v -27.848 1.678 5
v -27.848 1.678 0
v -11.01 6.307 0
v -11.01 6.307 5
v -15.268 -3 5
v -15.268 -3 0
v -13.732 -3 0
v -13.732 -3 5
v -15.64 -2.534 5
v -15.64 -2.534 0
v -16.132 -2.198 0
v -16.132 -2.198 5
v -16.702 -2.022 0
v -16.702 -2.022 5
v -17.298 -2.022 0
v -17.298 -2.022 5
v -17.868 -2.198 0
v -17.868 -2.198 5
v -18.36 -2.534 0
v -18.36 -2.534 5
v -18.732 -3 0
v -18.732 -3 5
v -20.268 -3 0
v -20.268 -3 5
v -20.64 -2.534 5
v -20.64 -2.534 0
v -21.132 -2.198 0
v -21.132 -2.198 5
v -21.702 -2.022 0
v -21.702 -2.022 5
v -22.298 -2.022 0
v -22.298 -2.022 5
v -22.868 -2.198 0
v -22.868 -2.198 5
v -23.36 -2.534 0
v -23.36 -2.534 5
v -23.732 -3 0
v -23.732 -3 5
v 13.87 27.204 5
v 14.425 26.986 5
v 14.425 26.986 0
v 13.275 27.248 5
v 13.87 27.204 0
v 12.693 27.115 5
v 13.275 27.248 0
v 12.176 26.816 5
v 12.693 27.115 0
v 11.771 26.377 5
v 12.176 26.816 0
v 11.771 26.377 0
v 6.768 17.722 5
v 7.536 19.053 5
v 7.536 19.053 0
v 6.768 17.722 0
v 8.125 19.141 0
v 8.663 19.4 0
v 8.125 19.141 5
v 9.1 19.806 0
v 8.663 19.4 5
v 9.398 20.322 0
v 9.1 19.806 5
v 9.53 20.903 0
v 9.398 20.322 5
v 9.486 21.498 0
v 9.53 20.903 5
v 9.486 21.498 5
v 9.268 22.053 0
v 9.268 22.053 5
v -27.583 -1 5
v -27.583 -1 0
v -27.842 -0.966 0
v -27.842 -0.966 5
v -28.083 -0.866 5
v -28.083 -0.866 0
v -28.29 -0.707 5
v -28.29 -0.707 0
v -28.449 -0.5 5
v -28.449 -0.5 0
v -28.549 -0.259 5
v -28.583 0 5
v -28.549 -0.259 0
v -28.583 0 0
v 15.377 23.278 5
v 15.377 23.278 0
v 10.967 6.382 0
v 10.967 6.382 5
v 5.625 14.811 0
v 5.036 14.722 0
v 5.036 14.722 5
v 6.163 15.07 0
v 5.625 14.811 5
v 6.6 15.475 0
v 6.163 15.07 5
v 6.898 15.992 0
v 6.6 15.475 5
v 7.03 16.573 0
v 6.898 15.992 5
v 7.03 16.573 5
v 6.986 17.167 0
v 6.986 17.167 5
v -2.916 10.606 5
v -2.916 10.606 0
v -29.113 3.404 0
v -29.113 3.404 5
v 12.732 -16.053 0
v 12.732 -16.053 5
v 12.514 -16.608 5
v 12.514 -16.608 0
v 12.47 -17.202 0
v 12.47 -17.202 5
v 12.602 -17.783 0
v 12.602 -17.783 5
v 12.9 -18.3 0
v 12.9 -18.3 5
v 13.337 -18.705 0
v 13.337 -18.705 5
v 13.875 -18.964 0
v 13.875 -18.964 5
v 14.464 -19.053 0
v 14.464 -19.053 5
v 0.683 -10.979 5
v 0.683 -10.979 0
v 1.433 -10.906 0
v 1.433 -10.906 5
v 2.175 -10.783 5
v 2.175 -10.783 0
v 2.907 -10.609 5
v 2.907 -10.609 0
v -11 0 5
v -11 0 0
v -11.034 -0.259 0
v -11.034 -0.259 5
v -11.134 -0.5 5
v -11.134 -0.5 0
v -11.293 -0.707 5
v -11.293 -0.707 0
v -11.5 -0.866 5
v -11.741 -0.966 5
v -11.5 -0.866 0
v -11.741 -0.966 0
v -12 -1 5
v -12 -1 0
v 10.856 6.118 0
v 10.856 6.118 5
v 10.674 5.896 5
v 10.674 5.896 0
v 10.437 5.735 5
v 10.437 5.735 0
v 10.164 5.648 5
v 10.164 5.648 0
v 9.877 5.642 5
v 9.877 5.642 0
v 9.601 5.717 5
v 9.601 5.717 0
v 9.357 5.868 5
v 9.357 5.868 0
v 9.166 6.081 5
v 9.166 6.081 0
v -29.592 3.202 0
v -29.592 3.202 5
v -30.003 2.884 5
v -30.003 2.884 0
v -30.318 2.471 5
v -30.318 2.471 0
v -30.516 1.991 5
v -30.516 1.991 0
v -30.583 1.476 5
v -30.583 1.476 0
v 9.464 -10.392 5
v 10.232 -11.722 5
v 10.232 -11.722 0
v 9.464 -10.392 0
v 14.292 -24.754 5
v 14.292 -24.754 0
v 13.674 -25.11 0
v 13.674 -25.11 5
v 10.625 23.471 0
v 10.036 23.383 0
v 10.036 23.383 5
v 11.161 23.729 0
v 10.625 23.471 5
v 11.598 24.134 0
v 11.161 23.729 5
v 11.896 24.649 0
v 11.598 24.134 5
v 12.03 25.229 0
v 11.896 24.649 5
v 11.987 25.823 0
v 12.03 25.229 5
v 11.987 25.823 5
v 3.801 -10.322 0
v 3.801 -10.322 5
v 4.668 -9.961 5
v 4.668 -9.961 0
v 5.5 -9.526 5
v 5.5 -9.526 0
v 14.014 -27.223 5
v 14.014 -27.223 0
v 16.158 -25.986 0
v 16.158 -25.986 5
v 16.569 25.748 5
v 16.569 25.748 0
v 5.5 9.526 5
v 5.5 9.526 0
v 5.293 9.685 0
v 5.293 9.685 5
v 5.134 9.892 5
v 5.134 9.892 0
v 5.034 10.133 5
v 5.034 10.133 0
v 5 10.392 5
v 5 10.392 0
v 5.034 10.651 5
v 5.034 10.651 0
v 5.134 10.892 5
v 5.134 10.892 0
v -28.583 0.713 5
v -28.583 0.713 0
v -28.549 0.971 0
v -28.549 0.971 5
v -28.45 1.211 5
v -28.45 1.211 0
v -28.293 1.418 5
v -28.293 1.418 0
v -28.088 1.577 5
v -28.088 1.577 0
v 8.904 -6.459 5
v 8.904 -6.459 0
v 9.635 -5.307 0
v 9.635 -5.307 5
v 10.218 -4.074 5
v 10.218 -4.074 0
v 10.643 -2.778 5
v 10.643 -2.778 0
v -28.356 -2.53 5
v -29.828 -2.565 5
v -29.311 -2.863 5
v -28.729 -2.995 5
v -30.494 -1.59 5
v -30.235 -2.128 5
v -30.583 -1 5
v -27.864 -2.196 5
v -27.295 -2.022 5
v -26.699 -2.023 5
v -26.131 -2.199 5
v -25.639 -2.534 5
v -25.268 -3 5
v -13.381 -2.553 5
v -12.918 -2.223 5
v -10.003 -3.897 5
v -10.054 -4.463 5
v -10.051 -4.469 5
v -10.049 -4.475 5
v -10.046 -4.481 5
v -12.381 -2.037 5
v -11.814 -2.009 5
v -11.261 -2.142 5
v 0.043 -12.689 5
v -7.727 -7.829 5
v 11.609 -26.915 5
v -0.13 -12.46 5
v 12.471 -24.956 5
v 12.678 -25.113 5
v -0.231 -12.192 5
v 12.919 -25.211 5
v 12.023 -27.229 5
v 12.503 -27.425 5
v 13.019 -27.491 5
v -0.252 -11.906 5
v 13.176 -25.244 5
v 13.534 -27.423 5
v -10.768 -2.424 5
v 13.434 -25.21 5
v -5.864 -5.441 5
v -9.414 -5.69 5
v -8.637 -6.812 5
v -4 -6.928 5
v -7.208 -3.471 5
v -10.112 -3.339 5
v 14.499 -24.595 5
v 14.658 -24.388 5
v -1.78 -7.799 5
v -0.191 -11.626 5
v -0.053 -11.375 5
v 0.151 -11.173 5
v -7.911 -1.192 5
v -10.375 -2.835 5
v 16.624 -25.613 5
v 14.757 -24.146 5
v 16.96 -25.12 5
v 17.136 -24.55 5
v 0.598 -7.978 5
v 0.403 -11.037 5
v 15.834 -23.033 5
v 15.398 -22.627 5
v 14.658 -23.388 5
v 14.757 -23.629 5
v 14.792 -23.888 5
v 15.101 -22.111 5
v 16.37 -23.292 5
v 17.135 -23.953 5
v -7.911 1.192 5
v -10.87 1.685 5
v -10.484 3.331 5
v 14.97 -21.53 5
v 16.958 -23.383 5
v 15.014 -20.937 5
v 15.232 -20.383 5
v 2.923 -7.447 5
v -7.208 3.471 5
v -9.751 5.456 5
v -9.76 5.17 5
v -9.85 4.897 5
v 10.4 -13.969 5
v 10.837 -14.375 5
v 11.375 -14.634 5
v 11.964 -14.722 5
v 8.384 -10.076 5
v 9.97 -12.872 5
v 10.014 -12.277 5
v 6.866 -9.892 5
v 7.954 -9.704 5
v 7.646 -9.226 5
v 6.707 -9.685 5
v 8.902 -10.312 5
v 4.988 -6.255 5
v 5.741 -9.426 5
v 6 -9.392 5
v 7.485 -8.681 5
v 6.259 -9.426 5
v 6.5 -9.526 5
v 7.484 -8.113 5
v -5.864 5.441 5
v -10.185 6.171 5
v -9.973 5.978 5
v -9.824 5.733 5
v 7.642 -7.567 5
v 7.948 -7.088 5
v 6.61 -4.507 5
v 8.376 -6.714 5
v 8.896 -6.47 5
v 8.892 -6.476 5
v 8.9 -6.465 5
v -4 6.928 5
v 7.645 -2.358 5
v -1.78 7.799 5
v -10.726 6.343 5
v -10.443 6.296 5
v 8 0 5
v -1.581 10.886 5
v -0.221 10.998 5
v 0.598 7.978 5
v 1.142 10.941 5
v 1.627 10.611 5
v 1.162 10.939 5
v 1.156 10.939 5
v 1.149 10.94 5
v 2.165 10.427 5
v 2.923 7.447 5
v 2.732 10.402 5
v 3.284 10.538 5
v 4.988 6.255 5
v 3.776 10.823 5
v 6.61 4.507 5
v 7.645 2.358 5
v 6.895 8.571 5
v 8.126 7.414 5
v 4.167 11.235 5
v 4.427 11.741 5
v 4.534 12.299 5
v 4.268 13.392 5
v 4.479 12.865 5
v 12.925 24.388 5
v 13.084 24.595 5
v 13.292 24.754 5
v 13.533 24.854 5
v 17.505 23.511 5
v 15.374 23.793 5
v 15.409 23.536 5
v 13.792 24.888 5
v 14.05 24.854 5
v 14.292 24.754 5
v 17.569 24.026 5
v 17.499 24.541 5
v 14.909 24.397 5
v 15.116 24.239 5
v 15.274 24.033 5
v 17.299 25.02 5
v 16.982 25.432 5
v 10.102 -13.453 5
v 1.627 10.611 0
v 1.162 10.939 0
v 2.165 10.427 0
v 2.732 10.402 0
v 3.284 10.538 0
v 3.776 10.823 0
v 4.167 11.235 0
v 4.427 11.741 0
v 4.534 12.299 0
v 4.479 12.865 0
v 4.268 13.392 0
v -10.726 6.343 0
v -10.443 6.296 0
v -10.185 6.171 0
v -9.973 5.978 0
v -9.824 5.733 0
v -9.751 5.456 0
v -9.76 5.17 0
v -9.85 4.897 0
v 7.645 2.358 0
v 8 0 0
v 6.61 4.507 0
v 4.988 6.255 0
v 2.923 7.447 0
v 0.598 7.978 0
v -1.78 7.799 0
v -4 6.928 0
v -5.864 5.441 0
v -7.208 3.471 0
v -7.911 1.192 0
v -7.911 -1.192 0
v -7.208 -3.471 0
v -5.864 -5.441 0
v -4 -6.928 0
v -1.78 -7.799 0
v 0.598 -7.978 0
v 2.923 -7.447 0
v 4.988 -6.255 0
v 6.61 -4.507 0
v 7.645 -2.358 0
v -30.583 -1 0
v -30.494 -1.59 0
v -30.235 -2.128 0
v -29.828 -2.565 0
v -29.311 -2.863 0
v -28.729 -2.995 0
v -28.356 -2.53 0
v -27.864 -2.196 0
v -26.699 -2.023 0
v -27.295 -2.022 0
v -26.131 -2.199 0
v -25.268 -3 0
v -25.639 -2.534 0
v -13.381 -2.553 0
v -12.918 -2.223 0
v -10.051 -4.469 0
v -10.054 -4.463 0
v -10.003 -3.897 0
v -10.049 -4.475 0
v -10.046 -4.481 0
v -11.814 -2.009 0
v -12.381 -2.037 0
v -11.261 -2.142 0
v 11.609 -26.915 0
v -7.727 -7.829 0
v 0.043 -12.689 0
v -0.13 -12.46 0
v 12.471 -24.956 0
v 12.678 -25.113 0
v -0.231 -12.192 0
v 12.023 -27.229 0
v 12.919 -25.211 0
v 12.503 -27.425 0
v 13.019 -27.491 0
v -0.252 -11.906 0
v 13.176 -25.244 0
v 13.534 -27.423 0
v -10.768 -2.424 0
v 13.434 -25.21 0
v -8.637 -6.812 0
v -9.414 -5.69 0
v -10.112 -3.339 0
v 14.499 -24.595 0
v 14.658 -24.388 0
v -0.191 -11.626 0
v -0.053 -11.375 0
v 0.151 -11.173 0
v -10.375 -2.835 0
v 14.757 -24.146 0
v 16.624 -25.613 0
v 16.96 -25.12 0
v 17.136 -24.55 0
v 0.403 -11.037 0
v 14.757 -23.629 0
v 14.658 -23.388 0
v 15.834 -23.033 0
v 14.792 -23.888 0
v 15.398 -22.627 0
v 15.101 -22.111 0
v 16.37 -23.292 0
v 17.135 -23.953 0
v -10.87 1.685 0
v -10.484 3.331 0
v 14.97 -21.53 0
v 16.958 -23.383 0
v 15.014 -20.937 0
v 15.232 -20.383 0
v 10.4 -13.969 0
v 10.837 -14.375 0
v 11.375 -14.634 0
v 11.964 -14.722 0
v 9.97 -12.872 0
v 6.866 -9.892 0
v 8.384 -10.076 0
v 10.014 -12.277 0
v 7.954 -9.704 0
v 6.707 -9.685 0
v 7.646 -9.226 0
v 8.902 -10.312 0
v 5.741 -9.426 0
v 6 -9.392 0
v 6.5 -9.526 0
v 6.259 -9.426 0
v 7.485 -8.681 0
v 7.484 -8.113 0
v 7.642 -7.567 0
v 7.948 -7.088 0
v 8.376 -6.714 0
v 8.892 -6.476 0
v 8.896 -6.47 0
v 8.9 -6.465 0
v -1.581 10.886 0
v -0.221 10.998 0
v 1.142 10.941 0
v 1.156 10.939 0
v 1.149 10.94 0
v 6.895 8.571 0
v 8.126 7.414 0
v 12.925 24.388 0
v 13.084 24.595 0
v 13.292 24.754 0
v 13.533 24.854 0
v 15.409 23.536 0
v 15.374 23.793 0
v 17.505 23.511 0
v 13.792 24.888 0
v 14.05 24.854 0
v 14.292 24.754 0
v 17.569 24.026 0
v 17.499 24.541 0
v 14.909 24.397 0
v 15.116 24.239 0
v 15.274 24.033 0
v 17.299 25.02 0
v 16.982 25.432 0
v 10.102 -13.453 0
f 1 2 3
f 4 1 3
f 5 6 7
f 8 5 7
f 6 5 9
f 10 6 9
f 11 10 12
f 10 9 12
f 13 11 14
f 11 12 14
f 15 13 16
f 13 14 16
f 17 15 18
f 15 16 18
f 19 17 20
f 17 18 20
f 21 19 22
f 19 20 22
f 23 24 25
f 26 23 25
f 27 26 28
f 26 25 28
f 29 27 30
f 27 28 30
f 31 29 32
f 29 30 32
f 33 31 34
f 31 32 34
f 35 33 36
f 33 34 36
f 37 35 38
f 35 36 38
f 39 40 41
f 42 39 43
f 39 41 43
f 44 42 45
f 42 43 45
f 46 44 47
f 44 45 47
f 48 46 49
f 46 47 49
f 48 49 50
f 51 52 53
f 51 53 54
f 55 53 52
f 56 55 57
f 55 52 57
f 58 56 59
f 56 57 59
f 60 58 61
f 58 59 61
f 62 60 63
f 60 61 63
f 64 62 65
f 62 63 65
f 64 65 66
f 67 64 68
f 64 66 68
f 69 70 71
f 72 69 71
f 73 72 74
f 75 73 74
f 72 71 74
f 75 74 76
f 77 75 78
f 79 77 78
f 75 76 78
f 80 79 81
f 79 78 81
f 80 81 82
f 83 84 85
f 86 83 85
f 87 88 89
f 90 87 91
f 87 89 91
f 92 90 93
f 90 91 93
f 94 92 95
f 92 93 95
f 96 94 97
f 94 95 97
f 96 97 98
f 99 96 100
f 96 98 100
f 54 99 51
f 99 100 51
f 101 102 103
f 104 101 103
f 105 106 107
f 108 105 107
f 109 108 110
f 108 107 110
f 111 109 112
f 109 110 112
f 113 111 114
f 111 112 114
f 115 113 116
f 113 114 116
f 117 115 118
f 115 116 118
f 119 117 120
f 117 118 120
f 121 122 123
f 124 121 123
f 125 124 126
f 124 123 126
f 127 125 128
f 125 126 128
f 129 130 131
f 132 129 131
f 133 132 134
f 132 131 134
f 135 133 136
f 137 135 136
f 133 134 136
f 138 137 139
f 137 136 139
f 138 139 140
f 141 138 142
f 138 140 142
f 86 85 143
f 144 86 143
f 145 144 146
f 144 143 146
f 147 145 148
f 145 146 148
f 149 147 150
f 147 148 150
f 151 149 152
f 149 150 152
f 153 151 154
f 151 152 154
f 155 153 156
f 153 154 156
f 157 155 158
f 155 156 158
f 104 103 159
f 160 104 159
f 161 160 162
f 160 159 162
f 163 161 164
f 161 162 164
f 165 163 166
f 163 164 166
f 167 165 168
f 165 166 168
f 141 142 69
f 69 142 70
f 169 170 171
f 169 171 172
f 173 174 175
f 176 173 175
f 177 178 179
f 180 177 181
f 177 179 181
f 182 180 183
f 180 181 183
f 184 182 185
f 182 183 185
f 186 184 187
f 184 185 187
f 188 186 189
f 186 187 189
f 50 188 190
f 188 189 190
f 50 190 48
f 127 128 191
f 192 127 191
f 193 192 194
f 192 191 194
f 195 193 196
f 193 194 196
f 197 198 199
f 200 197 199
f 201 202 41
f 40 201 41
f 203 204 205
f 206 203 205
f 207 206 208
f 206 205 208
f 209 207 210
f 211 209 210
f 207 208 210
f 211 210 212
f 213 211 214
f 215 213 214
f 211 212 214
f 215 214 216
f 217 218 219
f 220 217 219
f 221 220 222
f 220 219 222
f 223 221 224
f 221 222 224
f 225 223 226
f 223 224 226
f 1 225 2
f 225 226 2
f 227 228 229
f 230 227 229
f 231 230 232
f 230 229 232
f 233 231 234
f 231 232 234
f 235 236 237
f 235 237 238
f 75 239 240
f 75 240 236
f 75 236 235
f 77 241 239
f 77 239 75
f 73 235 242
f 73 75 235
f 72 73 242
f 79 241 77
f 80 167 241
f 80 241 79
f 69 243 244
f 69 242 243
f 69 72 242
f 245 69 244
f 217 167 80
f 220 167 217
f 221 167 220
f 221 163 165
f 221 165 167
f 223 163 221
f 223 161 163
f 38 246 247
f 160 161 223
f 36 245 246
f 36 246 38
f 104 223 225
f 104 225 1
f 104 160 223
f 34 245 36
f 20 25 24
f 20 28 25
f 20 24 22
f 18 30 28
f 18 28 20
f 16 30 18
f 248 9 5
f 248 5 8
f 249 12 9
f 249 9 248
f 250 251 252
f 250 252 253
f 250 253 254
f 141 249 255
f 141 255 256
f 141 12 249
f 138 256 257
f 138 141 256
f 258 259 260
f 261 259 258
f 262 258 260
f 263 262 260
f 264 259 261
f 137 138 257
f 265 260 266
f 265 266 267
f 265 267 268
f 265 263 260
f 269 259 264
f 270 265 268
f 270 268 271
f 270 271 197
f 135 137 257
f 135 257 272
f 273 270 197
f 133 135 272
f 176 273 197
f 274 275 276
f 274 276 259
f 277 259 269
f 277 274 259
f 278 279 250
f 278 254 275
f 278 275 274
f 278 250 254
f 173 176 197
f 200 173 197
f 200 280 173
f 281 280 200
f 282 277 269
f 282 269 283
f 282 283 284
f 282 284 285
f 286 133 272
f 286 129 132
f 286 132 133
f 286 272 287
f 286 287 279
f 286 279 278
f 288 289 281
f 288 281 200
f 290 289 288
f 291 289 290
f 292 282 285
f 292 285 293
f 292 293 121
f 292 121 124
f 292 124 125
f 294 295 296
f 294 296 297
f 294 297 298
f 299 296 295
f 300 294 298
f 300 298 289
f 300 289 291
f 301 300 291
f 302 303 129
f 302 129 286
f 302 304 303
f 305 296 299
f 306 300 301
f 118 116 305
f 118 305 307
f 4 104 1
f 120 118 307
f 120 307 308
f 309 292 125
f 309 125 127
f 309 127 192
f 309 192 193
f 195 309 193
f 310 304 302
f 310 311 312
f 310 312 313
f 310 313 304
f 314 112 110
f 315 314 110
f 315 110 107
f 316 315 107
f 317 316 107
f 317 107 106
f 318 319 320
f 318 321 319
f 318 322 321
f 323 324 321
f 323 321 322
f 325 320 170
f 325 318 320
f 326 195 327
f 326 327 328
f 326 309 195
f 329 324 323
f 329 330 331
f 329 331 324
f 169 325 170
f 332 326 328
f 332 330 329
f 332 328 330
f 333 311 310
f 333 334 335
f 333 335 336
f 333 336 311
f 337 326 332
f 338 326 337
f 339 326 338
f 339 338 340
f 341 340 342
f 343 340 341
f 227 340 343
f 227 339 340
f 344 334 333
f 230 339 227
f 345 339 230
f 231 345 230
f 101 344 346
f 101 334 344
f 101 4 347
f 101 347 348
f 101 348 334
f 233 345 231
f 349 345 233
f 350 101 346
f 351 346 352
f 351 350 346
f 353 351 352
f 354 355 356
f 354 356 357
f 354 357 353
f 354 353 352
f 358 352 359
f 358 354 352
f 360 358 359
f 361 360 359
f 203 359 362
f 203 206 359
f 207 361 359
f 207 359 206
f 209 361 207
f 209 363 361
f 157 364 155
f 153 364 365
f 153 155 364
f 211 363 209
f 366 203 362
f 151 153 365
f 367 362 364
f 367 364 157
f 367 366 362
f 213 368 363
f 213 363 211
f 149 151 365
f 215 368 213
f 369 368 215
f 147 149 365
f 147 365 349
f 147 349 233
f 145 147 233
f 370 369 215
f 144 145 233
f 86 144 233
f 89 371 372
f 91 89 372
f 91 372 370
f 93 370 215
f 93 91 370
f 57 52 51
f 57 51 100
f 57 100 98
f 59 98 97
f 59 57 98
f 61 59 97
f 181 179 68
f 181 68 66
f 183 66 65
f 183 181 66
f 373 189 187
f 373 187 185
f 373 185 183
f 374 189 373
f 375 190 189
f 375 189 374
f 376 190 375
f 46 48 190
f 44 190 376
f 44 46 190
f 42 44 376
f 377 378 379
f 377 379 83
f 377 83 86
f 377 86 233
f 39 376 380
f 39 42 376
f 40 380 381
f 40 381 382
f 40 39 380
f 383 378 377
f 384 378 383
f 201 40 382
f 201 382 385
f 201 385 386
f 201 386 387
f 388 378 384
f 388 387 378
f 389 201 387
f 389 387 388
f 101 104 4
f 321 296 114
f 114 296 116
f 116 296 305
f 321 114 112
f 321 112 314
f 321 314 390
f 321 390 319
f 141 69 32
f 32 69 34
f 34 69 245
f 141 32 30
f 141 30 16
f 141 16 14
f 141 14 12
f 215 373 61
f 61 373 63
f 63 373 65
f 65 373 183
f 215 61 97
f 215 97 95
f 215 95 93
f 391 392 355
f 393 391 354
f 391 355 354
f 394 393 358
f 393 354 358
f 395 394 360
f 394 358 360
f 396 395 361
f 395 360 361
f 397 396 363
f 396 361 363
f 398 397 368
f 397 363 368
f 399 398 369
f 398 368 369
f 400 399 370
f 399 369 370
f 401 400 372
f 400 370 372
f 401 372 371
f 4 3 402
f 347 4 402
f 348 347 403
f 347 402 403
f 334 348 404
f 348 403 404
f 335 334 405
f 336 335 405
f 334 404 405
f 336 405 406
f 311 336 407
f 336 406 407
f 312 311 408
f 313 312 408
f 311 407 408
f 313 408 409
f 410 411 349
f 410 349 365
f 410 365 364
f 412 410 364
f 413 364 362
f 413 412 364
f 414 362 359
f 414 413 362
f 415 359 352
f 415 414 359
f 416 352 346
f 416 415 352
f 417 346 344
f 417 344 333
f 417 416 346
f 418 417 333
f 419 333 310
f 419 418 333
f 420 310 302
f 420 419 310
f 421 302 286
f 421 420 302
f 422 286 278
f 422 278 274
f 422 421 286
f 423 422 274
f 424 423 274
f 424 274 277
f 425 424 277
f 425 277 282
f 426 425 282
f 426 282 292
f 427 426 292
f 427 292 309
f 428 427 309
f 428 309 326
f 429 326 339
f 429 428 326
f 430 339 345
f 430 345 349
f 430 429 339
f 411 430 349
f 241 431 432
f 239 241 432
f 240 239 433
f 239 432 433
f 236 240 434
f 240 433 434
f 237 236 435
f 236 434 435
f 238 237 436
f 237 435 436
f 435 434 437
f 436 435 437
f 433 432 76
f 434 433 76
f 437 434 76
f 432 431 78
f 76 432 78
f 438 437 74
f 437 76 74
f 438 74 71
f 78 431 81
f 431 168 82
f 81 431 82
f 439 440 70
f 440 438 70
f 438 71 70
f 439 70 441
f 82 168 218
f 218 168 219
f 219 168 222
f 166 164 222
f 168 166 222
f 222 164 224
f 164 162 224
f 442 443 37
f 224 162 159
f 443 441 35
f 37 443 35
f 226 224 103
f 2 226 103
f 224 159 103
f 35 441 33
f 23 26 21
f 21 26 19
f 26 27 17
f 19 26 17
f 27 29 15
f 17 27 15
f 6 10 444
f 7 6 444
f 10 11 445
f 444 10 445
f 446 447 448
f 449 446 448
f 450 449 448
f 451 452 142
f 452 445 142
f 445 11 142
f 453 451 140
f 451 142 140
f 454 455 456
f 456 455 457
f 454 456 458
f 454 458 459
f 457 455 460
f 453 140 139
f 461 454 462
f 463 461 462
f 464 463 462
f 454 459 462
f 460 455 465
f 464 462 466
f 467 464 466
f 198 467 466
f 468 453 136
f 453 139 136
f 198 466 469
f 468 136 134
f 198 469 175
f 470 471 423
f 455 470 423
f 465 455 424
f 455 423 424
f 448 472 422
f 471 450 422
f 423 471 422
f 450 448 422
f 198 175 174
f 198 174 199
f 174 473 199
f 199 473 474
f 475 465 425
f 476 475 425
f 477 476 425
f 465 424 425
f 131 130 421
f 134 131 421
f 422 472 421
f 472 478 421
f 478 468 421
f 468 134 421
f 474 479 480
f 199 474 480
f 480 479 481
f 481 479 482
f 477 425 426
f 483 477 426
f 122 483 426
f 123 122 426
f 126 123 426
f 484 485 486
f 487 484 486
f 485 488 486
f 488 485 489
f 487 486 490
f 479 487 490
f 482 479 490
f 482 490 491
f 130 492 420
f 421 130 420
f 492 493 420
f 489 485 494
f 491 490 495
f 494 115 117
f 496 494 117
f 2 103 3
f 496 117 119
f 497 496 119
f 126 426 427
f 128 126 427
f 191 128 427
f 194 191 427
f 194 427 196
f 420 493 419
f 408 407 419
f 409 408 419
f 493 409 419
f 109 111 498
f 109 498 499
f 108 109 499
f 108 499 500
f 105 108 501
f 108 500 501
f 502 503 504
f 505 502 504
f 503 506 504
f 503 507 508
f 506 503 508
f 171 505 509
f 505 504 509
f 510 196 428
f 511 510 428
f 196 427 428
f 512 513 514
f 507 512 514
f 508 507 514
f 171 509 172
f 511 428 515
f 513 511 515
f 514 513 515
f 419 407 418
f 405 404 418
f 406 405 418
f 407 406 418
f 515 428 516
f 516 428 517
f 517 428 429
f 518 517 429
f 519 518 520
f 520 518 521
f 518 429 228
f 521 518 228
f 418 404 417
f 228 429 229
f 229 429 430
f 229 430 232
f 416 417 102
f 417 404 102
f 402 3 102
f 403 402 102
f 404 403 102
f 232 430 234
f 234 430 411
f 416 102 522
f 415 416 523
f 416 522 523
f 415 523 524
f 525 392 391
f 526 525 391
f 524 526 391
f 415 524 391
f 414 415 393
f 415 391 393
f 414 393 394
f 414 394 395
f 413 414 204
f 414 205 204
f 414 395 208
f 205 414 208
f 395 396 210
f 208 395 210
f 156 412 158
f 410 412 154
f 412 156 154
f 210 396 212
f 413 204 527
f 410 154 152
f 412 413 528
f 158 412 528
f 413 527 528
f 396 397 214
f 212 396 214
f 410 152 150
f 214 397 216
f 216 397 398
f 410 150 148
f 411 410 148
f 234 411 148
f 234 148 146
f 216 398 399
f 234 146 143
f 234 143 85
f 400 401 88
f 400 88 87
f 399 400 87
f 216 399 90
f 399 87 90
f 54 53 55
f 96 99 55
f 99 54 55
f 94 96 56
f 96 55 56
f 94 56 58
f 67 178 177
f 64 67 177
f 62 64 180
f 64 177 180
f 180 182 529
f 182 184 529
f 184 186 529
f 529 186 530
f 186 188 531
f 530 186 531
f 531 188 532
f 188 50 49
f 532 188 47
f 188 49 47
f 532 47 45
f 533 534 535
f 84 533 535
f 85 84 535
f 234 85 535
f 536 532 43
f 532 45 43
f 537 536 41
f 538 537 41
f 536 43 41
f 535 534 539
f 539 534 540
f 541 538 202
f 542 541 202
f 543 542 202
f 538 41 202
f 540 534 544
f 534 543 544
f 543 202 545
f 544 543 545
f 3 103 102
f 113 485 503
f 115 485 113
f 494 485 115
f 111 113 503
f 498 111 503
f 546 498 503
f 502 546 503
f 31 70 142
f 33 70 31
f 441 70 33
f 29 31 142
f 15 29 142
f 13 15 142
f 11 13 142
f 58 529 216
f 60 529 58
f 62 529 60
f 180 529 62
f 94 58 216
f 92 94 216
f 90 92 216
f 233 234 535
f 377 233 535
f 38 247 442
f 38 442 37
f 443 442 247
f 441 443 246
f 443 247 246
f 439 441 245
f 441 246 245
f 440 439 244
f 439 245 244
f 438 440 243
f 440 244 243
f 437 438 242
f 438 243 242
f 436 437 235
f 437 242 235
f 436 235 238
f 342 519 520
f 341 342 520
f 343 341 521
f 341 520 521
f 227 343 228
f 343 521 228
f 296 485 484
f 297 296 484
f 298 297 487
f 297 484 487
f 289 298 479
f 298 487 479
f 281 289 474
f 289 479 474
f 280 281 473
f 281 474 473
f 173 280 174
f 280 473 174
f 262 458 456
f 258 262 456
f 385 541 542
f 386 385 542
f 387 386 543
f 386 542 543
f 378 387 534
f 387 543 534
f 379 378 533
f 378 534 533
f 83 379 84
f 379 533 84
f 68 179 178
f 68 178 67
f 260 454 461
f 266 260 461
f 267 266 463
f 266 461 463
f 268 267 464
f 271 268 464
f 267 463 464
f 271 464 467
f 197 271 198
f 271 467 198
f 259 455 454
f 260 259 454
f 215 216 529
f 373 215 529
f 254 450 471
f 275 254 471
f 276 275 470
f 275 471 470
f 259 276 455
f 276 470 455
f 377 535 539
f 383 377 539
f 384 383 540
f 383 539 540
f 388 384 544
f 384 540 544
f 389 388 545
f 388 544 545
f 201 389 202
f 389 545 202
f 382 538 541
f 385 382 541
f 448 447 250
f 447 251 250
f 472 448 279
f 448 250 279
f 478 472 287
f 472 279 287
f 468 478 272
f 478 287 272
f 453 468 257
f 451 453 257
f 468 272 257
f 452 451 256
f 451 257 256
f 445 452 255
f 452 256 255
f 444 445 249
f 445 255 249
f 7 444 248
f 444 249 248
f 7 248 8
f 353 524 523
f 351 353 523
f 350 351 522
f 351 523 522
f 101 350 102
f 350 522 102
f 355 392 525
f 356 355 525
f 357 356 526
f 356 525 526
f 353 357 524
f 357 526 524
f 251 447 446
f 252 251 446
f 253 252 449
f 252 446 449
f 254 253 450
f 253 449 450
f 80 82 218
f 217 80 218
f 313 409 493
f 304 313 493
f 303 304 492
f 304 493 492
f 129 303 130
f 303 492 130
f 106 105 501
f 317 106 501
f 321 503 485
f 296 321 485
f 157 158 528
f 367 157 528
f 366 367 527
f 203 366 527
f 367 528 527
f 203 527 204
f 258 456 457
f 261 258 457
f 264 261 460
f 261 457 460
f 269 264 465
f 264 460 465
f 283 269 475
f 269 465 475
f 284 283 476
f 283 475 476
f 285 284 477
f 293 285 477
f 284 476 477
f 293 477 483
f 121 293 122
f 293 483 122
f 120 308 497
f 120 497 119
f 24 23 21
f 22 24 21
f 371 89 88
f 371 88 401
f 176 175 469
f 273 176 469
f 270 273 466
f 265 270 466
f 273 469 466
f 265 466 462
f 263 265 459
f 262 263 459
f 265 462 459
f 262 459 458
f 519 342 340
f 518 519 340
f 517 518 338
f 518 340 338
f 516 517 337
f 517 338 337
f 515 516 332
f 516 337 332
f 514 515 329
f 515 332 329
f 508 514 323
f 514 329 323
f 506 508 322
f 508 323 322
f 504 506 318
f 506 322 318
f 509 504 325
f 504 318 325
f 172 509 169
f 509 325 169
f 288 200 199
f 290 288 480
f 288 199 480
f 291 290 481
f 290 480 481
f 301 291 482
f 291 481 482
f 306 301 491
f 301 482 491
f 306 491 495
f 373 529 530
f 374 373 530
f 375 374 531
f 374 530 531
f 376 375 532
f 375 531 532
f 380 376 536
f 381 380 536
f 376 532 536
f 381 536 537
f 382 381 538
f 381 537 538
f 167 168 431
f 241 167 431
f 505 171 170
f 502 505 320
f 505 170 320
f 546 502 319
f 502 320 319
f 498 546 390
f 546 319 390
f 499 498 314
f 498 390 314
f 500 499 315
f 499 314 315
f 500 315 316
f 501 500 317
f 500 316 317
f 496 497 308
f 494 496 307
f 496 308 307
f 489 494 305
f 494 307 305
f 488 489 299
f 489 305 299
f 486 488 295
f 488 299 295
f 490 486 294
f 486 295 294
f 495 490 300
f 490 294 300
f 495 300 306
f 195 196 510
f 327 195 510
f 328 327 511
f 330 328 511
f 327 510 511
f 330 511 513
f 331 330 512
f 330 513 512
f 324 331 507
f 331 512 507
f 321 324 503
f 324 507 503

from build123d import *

# Parameters (mm, degrees)
F0_R     = 8
F1_DEPTH = 5
F2_R     = 2
F3_DEPTH = 25


with BuildPart() as f1:
    # F0 (on Top) → F1 (new body)
    with BuildSketch(Plane.XY):
        with BuildLine():
            ThreePointArc((-30.583005, -1), (-29.997219, -2.414214), (-28.583005, -3))
            Line((-28.583005, -3), (-12.328828, -3))
            ThreePointArc((-12.328828, -3), (-10.968, -3.402824), (-10.045712, -4.481481))
            ThreePointArc((-10.045712, -4.481481), (-9.04279, -6.263222), (-7.727447, -7.828573))
            Line((-7.727447, -7.828573), (11.608563, -26.91481))
            ThreePointArc((11.608563, -26.91481), (12.758948, -27.475161), (14.013553, -27.223484))
            Line((14.013553, -27.223484), (16.157528, -25.985659))
            ThreePointArc((16.157528, -25.985659), (17.08938, -24.771247), (16.889579, -23.253609))
            Line((16.889579, -23.253609), (8.76249, -9.177078))
            ThreePointArc((8.76249, -9.177078), (8.430932, -7.797155), (8.903933, -6.459101))
            ThreePointArc((8.903933, -6.459101), (9.945504, -4.699675), (10.643467, -2.777879))
            Line((10.643467, -2.777879), (17.504628, 23.510715))
            ThreePointArc((17.504628, 23.510715), (17.414713, 24.787153), (16.569452, 25.747835))
            Line((16.569452, 25.747835), (14.425477, 26.985659))
            ThreePointArc((14.425477, 26.985659), (12.907839, 27.18546), (11.693426, 26.253609))
            Line((11.693426, 26.253609), (3.566338, 12.177078))
            ThreePointArc((3.566338, 12.177078), (2.537068, 11.199979), (1.141779, 10.940582))
            ThreePointArc((1.141779, 10.940582), (-0.902714, 10.962897), (-2.91602, 10.606452))
            Line((-2.91602, 10.606452), (-29.113191, 3.404094))
            ThreePointArc((-29.113191, 3.404094), (-30.173661, 2.688008), (-30.583005, 1.475649))
            Line((-30.583005, 1.475649), (-30.583005, -1))
        make_face()
        with BuildLine():
            Line((6.866025, -9.892305), (14.657528, -23.387583))
            ThreePointArc((14.657528, -23.387583), (14.757428, -24.146402), (14.291503, -24.753609))
            Line((14.291503, -24.753609), (13.673617, -25.110345))
            ThreePointArc((13.673617, -25.110345), (13.046314, -25.236184), (12.471122, -24.956008))
            Line((12.471122, -24.956008), (0.043078, -12.688504))
            ThreePointArc((0.043078, -12.688504), (-0.190899, -11.626074), (0.683442, -10.978748))
            ThreePointArc((0.683442, -10.978748), (1.804868, -10.850919), (2.907292, -10.608848))
            ThreePointArc((2.907292, -10.608848), (4.238352, -10.150683), (5.5, -9.526279))
            ThreePointArc((5.5, -9.526279), (6.258819, -9.426379), (6.866025, -9.892305))
        make_face(mode=Mode.SUBTRACT)
        with BuildLine():
            ThreePointArc((-11.010106, 6.306945), (-9.973026, 5.97836), (-9.849596, 4.897495))
            ThreePointArc((-9.849596, 4.897495), (-10.708538, 2.515397), (-11, 0))
            ThreePointArc((-11, 0), (-11.292893, -0.707107), (-12, -1))
            Line((-12, -1), (-27.583005, -1))
            ThreePointArc((-27.583005, -1), (-28.290112, -0.707107), (-28.583005, 0))
            Line((-28.583005, 0), (-28.583005, 0.713473))
            ThreePointArc((-28.583005, 0.713473), (-28.378333, 1.319652), (-27.848098, 1.677696))
            Line((-27.848098, 1.677696), (-11.010106, 6.306945))
        make_face(mode=Mode.SUBTRACT)
        Circle(F0_R, mode=Mode.SUBTRACT)
        with BuildLine():
            Line((5.133975, 10.892305), (12.925477, 24.387583))
            ThreePointArc((12.925477, 24.387583), (13.532684, 24.853509), (14.291503, 24.753609))
            Line((14.291503, 24.753609), (14.909388, 24.396872))
            ThreePointArc((14.909388, 24.396872), (15.332019, 23.916531), (15.376976, 23.278312))
            Line((15.376976, 23.278312), (10.967028, 6.381559))
            ThreePointArc((10.967028, 6.381559), (10.163925, 5.647714), (9.166153, 6.081252))
            ThreePointArc((9.166153, 6.081252), (7.532667, 8.016167), (5.5, 9.526279))
            ThreePointArc((5.5, 9.526279), (5.034074, 10.133486), (5.133975, 10.892305))
        make_face(mode=Mode.SUBTRACT)
    extrude(amount=F1_DEPTH)

    # F2 (on face) → F3 (cut)
    with BuildSketch(Plane.XY.offset(5)):
        with Locations((-27, -4)):
            Circle(F2_R)
        with Locations((-22, -4)):
            Circle(F2_R)
        with Locations((-17, -4)):
            Circle(F2_R)
        with Locations((-12, -4)):
            Circle(F2_R)
        with Locations((9.464102, -8.392305)):
            Circle(F2_R)
        with Locations((11.964102, -12.722432)):
            Circle(F2_R)
        with Locations((16.964102, -21.382686)):
            Circle(F2_R)
        with Locations((14.464102, -17.052559)):
            Circle(F2_R)
        with Locations((2.535898, 12.392305)):
            Circle(F2_R)
        with Locations((5.035898, 16.722432)):
            Circle(F2_R)
        with Locations((10.035898, 25.382686)):
            Circle(F2_R)
        with Locations((7.535898, 21.052559)):
            Circle(F2_R)
    extrude(amount=-F3_DEPTH, mode=Mode.SUBTRACT)


solid = f1.part
